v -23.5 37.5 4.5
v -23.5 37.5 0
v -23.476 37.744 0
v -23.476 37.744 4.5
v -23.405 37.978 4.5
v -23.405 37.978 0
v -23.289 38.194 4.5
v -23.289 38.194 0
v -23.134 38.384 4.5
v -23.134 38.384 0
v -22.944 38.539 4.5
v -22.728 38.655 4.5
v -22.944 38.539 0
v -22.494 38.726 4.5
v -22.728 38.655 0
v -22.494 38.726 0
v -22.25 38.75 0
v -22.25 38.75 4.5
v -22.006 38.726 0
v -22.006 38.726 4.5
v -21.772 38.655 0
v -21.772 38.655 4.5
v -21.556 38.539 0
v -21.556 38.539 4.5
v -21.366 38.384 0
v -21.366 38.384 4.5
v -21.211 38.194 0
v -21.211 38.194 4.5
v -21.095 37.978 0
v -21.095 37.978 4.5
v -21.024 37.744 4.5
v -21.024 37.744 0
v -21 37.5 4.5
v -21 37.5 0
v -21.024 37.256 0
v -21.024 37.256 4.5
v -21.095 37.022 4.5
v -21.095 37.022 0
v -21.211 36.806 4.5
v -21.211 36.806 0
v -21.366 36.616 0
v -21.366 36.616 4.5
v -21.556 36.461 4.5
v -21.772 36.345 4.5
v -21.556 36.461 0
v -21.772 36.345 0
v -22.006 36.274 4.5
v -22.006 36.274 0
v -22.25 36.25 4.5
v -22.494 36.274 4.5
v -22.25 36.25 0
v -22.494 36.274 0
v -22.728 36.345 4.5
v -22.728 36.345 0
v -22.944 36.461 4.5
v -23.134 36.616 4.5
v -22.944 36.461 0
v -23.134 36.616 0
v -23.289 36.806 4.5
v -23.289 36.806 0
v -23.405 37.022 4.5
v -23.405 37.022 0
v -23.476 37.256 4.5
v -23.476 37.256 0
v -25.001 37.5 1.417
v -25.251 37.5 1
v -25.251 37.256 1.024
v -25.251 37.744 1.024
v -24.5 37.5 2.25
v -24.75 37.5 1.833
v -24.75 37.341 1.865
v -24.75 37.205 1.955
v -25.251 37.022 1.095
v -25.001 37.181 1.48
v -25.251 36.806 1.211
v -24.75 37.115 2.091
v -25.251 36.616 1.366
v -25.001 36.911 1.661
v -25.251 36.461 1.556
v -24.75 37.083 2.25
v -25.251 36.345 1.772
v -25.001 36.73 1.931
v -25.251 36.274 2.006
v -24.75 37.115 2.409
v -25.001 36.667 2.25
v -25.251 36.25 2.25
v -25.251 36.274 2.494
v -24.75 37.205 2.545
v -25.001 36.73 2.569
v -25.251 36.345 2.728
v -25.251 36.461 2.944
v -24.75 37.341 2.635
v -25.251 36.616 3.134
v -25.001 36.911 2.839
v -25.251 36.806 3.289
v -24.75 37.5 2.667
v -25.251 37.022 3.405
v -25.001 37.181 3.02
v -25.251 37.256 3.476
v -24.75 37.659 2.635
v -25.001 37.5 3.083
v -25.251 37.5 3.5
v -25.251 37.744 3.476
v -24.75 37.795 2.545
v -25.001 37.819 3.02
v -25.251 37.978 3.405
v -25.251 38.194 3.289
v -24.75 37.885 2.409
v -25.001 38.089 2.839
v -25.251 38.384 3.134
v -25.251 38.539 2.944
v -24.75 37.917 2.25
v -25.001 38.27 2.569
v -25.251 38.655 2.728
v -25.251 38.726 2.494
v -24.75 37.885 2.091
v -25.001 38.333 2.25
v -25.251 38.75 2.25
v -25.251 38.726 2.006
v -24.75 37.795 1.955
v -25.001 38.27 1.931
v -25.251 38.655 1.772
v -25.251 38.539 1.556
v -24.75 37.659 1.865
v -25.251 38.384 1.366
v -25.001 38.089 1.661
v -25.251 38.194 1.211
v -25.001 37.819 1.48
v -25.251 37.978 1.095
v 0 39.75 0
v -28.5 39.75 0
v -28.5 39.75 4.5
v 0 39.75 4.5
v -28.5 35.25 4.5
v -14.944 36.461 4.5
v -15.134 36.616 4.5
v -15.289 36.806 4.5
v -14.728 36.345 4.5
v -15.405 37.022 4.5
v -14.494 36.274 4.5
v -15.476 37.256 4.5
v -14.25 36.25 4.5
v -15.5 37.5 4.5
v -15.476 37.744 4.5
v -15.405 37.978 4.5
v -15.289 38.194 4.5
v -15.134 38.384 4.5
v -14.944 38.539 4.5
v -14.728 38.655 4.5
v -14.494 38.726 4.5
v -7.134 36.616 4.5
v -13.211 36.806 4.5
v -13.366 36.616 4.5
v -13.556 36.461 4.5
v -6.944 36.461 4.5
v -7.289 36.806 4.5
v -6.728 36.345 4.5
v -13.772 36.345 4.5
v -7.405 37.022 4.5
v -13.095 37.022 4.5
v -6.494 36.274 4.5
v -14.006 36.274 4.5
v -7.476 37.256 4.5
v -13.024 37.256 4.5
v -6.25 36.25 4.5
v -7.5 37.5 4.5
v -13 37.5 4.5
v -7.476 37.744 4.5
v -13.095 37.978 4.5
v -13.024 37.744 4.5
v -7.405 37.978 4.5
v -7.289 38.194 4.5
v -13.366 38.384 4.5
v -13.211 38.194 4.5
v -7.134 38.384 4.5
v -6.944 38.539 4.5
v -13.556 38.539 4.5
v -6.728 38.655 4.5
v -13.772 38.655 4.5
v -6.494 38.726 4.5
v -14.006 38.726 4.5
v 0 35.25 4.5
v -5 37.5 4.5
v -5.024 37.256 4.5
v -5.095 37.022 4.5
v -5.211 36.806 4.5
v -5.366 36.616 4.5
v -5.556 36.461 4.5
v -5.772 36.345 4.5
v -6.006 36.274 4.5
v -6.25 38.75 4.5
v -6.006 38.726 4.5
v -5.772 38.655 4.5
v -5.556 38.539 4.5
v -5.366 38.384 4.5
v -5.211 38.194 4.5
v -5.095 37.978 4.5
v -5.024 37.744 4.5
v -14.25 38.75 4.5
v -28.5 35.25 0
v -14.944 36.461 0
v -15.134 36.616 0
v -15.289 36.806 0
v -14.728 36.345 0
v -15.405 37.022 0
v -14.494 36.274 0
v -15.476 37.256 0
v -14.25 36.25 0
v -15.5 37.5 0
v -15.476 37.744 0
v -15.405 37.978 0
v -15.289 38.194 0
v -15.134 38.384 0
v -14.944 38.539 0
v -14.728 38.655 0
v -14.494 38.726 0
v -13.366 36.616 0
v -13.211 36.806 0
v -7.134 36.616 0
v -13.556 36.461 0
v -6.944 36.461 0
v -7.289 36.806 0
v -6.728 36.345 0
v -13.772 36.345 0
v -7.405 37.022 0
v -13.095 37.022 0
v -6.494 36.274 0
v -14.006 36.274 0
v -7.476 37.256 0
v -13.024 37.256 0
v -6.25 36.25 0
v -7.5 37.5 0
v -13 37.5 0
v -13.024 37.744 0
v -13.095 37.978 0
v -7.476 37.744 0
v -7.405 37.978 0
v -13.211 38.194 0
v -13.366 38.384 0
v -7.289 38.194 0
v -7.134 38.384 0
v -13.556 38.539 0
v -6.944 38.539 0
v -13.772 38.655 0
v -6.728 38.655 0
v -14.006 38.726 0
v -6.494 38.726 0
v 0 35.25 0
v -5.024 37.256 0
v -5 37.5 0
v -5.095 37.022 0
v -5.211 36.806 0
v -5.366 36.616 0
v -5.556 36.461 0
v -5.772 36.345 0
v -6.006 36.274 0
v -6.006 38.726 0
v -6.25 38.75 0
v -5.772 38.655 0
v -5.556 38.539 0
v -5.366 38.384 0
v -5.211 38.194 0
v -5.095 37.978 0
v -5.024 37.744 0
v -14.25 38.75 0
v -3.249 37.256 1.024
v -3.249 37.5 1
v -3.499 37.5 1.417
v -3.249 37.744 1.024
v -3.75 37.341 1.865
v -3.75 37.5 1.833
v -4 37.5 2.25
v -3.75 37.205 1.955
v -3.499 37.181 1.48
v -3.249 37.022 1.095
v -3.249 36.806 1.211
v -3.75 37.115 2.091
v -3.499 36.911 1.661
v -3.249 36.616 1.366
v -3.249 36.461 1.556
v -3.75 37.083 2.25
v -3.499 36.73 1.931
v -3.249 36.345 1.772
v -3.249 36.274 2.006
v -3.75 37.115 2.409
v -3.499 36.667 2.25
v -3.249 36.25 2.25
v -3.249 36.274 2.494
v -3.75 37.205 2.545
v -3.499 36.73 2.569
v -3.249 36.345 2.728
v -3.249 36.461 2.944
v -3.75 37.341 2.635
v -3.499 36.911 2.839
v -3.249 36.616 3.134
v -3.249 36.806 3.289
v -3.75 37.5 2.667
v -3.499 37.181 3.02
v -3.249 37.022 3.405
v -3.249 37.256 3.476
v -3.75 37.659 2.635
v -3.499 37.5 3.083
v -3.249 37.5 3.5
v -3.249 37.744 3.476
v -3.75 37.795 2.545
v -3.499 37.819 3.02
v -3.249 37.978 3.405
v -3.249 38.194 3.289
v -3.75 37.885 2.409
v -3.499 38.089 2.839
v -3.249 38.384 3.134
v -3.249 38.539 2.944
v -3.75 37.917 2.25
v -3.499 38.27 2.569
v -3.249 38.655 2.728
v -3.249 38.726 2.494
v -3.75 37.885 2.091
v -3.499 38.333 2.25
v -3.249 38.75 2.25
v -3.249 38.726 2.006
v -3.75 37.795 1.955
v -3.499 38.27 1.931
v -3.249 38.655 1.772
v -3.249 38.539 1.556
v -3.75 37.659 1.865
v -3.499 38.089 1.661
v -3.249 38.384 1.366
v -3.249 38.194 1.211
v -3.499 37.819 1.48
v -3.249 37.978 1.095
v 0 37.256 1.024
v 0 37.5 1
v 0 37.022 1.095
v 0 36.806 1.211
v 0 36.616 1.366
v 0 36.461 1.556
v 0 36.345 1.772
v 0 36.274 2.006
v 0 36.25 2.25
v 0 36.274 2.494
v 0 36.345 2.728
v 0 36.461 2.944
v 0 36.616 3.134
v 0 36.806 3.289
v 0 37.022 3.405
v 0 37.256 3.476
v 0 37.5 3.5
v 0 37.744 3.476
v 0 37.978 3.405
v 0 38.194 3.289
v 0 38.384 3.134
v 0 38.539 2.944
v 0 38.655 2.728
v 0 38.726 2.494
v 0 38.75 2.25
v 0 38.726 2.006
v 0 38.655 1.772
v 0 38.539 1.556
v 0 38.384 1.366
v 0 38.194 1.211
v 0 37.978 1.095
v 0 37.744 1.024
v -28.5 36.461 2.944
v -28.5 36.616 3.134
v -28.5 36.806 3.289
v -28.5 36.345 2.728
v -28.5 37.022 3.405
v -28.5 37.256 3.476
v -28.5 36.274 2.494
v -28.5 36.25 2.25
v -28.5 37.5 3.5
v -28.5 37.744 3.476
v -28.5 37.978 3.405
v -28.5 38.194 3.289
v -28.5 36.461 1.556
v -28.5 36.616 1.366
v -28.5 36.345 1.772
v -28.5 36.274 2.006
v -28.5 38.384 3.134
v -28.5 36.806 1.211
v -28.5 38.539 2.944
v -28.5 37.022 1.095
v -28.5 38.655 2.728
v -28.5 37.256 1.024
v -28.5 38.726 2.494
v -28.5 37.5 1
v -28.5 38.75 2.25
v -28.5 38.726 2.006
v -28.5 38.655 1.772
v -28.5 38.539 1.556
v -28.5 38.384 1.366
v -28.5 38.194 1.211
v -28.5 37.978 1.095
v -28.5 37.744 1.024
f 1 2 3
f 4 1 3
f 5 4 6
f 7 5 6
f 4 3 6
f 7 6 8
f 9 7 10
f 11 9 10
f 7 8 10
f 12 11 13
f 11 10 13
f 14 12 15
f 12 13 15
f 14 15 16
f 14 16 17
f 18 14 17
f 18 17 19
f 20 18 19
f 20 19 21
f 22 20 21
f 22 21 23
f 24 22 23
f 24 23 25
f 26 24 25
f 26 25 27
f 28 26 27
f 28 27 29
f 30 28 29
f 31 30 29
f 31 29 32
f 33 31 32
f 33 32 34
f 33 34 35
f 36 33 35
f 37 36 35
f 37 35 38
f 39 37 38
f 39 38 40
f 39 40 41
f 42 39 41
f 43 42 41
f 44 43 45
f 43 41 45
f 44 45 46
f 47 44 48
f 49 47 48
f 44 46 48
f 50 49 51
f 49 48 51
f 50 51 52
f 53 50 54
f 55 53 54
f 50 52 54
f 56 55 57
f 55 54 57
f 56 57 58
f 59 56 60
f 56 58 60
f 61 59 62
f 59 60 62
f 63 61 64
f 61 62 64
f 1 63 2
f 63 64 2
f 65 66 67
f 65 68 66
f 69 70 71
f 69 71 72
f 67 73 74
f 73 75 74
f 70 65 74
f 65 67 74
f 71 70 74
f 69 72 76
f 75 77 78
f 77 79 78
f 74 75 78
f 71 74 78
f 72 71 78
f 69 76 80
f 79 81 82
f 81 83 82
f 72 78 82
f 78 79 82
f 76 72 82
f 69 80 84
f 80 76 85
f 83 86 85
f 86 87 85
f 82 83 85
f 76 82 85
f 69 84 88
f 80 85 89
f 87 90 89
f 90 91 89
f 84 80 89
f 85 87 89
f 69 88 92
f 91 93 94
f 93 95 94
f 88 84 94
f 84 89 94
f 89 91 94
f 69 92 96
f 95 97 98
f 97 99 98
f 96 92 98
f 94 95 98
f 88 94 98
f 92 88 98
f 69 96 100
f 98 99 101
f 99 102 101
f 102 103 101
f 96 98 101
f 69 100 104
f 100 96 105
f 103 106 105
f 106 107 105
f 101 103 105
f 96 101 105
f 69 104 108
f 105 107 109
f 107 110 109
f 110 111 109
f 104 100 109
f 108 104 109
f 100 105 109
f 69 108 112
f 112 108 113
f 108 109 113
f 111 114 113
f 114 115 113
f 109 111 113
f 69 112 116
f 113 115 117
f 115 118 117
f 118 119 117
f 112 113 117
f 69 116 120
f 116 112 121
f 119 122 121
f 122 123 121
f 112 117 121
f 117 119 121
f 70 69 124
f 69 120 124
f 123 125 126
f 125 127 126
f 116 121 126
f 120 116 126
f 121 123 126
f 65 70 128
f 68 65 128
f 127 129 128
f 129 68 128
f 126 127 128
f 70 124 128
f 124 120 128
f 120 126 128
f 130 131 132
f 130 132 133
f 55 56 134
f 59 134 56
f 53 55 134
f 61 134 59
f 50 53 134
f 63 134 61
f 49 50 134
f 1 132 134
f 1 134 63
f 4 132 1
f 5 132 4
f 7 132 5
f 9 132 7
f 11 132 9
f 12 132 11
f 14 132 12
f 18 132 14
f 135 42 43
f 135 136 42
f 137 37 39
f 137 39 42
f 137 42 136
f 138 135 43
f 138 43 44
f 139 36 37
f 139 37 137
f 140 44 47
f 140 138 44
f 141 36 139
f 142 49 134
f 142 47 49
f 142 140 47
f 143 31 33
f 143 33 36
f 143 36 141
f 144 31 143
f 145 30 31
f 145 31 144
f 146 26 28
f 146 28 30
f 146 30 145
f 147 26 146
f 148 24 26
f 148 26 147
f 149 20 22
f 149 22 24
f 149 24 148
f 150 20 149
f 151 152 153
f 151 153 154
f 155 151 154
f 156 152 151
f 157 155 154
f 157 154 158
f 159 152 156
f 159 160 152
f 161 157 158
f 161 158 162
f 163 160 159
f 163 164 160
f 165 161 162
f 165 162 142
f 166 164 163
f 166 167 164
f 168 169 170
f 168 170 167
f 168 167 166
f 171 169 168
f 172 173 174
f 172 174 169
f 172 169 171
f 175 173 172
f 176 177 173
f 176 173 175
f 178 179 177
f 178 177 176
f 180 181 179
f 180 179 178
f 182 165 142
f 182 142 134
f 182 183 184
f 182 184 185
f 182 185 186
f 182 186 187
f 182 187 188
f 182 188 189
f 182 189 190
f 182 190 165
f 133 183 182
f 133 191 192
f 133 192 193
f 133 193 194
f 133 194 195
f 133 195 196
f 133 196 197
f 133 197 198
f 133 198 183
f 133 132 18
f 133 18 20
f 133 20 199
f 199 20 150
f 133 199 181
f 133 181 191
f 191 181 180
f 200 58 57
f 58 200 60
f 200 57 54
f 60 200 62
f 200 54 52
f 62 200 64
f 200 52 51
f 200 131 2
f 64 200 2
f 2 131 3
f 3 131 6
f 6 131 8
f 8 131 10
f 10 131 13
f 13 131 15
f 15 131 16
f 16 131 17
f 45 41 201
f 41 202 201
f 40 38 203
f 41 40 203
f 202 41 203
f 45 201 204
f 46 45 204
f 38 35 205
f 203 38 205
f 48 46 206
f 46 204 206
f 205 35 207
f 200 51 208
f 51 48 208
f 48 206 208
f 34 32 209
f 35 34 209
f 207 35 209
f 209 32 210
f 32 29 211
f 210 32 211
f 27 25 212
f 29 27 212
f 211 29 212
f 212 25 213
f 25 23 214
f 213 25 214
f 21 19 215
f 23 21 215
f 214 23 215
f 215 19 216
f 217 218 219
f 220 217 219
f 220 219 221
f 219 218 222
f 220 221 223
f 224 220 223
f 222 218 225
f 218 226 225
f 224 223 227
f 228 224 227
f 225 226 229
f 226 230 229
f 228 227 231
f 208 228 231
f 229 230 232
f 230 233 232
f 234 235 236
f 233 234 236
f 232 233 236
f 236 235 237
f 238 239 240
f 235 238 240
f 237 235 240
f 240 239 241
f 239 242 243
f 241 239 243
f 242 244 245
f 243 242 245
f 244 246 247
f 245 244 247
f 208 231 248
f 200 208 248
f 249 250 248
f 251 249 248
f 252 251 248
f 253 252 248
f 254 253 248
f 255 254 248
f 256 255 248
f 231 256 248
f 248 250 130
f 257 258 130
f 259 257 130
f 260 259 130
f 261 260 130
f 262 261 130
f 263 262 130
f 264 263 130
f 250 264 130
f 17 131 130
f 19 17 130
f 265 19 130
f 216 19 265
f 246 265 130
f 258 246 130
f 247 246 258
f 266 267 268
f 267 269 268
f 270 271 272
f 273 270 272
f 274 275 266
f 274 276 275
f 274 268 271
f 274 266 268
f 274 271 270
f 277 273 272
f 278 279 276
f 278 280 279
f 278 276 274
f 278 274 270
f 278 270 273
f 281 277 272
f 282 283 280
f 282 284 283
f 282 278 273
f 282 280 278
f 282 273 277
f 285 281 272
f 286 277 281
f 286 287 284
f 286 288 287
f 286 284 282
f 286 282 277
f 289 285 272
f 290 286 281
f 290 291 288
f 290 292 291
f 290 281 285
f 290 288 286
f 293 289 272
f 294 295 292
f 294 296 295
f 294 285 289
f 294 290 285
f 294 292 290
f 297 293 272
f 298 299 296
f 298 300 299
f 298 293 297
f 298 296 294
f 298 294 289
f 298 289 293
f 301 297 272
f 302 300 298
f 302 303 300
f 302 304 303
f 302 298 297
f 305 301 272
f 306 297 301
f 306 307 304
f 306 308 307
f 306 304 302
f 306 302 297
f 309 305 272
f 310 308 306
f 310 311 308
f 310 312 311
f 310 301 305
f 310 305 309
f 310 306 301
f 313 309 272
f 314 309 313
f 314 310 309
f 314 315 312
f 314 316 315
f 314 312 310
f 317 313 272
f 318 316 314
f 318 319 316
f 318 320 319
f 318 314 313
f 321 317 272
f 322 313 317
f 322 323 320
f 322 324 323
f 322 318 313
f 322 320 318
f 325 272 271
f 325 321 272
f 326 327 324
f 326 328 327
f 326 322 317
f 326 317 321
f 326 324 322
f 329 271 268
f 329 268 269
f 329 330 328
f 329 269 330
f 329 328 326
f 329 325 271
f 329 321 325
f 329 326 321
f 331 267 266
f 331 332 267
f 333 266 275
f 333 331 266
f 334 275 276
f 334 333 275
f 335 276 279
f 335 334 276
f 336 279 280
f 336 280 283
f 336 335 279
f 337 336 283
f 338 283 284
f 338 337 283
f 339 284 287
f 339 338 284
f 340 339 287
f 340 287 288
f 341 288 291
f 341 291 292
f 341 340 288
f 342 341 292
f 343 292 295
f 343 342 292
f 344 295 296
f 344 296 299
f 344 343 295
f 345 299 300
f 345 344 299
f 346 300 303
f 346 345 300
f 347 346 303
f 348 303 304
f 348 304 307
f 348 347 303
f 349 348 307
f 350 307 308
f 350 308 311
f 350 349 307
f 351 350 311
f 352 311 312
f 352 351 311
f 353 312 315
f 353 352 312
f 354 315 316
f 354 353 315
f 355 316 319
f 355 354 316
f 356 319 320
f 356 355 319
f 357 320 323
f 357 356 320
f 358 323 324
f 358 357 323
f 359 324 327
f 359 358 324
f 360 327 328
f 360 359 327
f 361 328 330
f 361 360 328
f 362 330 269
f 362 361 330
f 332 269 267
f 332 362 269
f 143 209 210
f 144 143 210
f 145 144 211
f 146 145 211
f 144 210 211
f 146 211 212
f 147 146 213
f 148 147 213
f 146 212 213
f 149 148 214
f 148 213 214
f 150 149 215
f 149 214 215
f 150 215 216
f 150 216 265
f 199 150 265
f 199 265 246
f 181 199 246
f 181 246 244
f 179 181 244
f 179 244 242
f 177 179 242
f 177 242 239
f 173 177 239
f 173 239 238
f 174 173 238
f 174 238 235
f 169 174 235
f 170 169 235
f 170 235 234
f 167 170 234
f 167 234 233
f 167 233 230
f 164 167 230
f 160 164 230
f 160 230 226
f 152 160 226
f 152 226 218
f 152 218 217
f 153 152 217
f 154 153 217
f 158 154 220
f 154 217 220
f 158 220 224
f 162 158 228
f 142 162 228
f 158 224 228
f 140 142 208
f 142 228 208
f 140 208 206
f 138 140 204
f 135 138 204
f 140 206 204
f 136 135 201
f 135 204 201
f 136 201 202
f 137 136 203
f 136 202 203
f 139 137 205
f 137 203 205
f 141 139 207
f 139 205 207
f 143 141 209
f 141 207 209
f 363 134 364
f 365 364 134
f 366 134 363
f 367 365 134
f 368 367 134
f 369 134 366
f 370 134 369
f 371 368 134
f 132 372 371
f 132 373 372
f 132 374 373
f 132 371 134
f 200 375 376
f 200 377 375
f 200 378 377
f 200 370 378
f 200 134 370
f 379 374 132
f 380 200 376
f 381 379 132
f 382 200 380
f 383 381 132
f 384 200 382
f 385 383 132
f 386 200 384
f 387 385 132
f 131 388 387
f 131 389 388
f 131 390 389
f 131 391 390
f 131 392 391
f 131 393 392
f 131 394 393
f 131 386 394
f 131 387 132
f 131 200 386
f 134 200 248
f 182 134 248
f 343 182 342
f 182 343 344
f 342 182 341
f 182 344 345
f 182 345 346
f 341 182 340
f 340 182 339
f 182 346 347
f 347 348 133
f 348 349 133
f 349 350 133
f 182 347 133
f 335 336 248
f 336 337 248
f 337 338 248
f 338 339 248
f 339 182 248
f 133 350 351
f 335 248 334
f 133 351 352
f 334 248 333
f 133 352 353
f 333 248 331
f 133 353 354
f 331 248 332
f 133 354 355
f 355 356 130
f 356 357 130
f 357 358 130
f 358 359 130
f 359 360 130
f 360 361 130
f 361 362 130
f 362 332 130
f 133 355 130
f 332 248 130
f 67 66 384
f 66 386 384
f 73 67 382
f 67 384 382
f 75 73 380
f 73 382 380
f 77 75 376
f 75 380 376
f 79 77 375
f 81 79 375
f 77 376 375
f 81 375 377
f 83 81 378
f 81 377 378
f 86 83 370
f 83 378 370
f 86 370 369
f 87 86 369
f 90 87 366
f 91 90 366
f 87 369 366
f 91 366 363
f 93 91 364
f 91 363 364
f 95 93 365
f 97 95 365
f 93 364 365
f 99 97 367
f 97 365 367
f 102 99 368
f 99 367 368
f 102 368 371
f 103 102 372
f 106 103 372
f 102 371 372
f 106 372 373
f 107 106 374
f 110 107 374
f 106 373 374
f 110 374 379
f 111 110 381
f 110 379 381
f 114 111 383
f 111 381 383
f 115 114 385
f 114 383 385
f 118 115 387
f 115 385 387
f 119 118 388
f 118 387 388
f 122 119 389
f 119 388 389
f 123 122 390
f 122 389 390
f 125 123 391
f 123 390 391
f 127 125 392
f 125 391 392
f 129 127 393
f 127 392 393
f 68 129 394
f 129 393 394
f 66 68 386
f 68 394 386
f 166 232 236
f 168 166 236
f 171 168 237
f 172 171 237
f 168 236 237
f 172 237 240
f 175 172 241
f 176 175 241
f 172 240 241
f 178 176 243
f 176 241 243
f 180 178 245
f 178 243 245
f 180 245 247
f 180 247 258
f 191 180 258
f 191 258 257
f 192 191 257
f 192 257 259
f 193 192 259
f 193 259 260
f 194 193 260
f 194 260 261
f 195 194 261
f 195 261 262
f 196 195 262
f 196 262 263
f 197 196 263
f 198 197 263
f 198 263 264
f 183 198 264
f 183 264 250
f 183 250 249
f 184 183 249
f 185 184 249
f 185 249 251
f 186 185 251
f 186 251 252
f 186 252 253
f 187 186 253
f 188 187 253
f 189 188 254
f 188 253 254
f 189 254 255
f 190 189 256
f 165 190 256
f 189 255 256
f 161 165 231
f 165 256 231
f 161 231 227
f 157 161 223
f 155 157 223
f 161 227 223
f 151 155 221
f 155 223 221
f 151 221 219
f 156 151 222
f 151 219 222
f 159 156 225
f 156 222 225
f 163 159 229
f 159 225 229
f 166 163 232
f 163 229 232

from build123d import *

# Parameters (mm, degrees)
SKETCH1_W                      = 28.5
SKETCH1_H                      = 4.5
BOSS_EXTRUDE1_DEPTH            = 4.5
SIDE_SHAFT_HOLES_M3_AT_2_COUNT = 2
SIDE_SHAFT_HOLES_M3_AT_2_PITCH = 47.562875198
M3X0_5_TAPPED_HOLE3_D          = 2.5


with BuildPart() as part:
    # Sketch1 → Boss-Extrude1 (new body)
    with BuildSketch(Plane.XY):
        with Locations((-14.25, 37.5)):
            Rectangle(SKETCH1_W, SKETCH1_H)
    extrude(amount=BOSS_EXTRUDE1_DEPTH)

    # Sketch2 → Side Shaft Holes (M3) (revolve, cut)
    with BuildSketch(Plane(origin=(0, 37.5, 2.25), x_dir=(0, 0, -1), z_dir=(0, 1, 0))):
        Polygon((0, 0), (0, 4), (1.25, 3.248924226), (1.25, 0), align=None)
    side_shaft_holes_m3 = revolve(axis=Axis((6.35, 37.5, 2.25), (-1, 0, 0)), mode=Mode.SUBTRACT)

    # Side Shaft Holes (M3) at 2: Side Shaft Holes (M3) ×2
    with Locations(*[(0, 0, -i * SIDE_SHAFT_HOLES_M3_AT_2_PITCH) for i in range(1, SIDE_SHAFT_HOLES_M3_AT_2_COUNT)]):
        add(side_shaft_holes_m3, mode=Mode.SUBTRACT)

    # Shaft Hole Mirror: Side Shaft Holes (M3) across plane
    add(side_shaft_holes_m3.mirror(Plane.ZY.offset(14.25)), mode=Mode.SUBTRACT)

    # Shaft Hole Mirror copy 1 sketch → Shaft Hole Mirror copy 1 (revolve, cut)
    with BuildSketch(Plane(origin=(-28.5, 37.5, -45.312875198), x_dir=(0, 0, -1), z_dir=(0, 1, 0))):
        Polygon((0, 0), (0, -4), (1.25, -3.248924226), (1.25, 0), align=None)
    revolve(axis=Axis((-34.85, 37.5, -45.312875198), (-1, 0, 0)), mode=Mode.SUBTRACT)

    # M3x0.5 Tapped Hole3 (through all)
    with Locations(Plane.XY.offset(4.5)):
        with Locations((-6.25, 37.5), (-14.25, 37.5), (-22.25, 37.5)):
            Hole(M3X0_5_TAPPED_HOLE3_D / 2)


solid = part.part
